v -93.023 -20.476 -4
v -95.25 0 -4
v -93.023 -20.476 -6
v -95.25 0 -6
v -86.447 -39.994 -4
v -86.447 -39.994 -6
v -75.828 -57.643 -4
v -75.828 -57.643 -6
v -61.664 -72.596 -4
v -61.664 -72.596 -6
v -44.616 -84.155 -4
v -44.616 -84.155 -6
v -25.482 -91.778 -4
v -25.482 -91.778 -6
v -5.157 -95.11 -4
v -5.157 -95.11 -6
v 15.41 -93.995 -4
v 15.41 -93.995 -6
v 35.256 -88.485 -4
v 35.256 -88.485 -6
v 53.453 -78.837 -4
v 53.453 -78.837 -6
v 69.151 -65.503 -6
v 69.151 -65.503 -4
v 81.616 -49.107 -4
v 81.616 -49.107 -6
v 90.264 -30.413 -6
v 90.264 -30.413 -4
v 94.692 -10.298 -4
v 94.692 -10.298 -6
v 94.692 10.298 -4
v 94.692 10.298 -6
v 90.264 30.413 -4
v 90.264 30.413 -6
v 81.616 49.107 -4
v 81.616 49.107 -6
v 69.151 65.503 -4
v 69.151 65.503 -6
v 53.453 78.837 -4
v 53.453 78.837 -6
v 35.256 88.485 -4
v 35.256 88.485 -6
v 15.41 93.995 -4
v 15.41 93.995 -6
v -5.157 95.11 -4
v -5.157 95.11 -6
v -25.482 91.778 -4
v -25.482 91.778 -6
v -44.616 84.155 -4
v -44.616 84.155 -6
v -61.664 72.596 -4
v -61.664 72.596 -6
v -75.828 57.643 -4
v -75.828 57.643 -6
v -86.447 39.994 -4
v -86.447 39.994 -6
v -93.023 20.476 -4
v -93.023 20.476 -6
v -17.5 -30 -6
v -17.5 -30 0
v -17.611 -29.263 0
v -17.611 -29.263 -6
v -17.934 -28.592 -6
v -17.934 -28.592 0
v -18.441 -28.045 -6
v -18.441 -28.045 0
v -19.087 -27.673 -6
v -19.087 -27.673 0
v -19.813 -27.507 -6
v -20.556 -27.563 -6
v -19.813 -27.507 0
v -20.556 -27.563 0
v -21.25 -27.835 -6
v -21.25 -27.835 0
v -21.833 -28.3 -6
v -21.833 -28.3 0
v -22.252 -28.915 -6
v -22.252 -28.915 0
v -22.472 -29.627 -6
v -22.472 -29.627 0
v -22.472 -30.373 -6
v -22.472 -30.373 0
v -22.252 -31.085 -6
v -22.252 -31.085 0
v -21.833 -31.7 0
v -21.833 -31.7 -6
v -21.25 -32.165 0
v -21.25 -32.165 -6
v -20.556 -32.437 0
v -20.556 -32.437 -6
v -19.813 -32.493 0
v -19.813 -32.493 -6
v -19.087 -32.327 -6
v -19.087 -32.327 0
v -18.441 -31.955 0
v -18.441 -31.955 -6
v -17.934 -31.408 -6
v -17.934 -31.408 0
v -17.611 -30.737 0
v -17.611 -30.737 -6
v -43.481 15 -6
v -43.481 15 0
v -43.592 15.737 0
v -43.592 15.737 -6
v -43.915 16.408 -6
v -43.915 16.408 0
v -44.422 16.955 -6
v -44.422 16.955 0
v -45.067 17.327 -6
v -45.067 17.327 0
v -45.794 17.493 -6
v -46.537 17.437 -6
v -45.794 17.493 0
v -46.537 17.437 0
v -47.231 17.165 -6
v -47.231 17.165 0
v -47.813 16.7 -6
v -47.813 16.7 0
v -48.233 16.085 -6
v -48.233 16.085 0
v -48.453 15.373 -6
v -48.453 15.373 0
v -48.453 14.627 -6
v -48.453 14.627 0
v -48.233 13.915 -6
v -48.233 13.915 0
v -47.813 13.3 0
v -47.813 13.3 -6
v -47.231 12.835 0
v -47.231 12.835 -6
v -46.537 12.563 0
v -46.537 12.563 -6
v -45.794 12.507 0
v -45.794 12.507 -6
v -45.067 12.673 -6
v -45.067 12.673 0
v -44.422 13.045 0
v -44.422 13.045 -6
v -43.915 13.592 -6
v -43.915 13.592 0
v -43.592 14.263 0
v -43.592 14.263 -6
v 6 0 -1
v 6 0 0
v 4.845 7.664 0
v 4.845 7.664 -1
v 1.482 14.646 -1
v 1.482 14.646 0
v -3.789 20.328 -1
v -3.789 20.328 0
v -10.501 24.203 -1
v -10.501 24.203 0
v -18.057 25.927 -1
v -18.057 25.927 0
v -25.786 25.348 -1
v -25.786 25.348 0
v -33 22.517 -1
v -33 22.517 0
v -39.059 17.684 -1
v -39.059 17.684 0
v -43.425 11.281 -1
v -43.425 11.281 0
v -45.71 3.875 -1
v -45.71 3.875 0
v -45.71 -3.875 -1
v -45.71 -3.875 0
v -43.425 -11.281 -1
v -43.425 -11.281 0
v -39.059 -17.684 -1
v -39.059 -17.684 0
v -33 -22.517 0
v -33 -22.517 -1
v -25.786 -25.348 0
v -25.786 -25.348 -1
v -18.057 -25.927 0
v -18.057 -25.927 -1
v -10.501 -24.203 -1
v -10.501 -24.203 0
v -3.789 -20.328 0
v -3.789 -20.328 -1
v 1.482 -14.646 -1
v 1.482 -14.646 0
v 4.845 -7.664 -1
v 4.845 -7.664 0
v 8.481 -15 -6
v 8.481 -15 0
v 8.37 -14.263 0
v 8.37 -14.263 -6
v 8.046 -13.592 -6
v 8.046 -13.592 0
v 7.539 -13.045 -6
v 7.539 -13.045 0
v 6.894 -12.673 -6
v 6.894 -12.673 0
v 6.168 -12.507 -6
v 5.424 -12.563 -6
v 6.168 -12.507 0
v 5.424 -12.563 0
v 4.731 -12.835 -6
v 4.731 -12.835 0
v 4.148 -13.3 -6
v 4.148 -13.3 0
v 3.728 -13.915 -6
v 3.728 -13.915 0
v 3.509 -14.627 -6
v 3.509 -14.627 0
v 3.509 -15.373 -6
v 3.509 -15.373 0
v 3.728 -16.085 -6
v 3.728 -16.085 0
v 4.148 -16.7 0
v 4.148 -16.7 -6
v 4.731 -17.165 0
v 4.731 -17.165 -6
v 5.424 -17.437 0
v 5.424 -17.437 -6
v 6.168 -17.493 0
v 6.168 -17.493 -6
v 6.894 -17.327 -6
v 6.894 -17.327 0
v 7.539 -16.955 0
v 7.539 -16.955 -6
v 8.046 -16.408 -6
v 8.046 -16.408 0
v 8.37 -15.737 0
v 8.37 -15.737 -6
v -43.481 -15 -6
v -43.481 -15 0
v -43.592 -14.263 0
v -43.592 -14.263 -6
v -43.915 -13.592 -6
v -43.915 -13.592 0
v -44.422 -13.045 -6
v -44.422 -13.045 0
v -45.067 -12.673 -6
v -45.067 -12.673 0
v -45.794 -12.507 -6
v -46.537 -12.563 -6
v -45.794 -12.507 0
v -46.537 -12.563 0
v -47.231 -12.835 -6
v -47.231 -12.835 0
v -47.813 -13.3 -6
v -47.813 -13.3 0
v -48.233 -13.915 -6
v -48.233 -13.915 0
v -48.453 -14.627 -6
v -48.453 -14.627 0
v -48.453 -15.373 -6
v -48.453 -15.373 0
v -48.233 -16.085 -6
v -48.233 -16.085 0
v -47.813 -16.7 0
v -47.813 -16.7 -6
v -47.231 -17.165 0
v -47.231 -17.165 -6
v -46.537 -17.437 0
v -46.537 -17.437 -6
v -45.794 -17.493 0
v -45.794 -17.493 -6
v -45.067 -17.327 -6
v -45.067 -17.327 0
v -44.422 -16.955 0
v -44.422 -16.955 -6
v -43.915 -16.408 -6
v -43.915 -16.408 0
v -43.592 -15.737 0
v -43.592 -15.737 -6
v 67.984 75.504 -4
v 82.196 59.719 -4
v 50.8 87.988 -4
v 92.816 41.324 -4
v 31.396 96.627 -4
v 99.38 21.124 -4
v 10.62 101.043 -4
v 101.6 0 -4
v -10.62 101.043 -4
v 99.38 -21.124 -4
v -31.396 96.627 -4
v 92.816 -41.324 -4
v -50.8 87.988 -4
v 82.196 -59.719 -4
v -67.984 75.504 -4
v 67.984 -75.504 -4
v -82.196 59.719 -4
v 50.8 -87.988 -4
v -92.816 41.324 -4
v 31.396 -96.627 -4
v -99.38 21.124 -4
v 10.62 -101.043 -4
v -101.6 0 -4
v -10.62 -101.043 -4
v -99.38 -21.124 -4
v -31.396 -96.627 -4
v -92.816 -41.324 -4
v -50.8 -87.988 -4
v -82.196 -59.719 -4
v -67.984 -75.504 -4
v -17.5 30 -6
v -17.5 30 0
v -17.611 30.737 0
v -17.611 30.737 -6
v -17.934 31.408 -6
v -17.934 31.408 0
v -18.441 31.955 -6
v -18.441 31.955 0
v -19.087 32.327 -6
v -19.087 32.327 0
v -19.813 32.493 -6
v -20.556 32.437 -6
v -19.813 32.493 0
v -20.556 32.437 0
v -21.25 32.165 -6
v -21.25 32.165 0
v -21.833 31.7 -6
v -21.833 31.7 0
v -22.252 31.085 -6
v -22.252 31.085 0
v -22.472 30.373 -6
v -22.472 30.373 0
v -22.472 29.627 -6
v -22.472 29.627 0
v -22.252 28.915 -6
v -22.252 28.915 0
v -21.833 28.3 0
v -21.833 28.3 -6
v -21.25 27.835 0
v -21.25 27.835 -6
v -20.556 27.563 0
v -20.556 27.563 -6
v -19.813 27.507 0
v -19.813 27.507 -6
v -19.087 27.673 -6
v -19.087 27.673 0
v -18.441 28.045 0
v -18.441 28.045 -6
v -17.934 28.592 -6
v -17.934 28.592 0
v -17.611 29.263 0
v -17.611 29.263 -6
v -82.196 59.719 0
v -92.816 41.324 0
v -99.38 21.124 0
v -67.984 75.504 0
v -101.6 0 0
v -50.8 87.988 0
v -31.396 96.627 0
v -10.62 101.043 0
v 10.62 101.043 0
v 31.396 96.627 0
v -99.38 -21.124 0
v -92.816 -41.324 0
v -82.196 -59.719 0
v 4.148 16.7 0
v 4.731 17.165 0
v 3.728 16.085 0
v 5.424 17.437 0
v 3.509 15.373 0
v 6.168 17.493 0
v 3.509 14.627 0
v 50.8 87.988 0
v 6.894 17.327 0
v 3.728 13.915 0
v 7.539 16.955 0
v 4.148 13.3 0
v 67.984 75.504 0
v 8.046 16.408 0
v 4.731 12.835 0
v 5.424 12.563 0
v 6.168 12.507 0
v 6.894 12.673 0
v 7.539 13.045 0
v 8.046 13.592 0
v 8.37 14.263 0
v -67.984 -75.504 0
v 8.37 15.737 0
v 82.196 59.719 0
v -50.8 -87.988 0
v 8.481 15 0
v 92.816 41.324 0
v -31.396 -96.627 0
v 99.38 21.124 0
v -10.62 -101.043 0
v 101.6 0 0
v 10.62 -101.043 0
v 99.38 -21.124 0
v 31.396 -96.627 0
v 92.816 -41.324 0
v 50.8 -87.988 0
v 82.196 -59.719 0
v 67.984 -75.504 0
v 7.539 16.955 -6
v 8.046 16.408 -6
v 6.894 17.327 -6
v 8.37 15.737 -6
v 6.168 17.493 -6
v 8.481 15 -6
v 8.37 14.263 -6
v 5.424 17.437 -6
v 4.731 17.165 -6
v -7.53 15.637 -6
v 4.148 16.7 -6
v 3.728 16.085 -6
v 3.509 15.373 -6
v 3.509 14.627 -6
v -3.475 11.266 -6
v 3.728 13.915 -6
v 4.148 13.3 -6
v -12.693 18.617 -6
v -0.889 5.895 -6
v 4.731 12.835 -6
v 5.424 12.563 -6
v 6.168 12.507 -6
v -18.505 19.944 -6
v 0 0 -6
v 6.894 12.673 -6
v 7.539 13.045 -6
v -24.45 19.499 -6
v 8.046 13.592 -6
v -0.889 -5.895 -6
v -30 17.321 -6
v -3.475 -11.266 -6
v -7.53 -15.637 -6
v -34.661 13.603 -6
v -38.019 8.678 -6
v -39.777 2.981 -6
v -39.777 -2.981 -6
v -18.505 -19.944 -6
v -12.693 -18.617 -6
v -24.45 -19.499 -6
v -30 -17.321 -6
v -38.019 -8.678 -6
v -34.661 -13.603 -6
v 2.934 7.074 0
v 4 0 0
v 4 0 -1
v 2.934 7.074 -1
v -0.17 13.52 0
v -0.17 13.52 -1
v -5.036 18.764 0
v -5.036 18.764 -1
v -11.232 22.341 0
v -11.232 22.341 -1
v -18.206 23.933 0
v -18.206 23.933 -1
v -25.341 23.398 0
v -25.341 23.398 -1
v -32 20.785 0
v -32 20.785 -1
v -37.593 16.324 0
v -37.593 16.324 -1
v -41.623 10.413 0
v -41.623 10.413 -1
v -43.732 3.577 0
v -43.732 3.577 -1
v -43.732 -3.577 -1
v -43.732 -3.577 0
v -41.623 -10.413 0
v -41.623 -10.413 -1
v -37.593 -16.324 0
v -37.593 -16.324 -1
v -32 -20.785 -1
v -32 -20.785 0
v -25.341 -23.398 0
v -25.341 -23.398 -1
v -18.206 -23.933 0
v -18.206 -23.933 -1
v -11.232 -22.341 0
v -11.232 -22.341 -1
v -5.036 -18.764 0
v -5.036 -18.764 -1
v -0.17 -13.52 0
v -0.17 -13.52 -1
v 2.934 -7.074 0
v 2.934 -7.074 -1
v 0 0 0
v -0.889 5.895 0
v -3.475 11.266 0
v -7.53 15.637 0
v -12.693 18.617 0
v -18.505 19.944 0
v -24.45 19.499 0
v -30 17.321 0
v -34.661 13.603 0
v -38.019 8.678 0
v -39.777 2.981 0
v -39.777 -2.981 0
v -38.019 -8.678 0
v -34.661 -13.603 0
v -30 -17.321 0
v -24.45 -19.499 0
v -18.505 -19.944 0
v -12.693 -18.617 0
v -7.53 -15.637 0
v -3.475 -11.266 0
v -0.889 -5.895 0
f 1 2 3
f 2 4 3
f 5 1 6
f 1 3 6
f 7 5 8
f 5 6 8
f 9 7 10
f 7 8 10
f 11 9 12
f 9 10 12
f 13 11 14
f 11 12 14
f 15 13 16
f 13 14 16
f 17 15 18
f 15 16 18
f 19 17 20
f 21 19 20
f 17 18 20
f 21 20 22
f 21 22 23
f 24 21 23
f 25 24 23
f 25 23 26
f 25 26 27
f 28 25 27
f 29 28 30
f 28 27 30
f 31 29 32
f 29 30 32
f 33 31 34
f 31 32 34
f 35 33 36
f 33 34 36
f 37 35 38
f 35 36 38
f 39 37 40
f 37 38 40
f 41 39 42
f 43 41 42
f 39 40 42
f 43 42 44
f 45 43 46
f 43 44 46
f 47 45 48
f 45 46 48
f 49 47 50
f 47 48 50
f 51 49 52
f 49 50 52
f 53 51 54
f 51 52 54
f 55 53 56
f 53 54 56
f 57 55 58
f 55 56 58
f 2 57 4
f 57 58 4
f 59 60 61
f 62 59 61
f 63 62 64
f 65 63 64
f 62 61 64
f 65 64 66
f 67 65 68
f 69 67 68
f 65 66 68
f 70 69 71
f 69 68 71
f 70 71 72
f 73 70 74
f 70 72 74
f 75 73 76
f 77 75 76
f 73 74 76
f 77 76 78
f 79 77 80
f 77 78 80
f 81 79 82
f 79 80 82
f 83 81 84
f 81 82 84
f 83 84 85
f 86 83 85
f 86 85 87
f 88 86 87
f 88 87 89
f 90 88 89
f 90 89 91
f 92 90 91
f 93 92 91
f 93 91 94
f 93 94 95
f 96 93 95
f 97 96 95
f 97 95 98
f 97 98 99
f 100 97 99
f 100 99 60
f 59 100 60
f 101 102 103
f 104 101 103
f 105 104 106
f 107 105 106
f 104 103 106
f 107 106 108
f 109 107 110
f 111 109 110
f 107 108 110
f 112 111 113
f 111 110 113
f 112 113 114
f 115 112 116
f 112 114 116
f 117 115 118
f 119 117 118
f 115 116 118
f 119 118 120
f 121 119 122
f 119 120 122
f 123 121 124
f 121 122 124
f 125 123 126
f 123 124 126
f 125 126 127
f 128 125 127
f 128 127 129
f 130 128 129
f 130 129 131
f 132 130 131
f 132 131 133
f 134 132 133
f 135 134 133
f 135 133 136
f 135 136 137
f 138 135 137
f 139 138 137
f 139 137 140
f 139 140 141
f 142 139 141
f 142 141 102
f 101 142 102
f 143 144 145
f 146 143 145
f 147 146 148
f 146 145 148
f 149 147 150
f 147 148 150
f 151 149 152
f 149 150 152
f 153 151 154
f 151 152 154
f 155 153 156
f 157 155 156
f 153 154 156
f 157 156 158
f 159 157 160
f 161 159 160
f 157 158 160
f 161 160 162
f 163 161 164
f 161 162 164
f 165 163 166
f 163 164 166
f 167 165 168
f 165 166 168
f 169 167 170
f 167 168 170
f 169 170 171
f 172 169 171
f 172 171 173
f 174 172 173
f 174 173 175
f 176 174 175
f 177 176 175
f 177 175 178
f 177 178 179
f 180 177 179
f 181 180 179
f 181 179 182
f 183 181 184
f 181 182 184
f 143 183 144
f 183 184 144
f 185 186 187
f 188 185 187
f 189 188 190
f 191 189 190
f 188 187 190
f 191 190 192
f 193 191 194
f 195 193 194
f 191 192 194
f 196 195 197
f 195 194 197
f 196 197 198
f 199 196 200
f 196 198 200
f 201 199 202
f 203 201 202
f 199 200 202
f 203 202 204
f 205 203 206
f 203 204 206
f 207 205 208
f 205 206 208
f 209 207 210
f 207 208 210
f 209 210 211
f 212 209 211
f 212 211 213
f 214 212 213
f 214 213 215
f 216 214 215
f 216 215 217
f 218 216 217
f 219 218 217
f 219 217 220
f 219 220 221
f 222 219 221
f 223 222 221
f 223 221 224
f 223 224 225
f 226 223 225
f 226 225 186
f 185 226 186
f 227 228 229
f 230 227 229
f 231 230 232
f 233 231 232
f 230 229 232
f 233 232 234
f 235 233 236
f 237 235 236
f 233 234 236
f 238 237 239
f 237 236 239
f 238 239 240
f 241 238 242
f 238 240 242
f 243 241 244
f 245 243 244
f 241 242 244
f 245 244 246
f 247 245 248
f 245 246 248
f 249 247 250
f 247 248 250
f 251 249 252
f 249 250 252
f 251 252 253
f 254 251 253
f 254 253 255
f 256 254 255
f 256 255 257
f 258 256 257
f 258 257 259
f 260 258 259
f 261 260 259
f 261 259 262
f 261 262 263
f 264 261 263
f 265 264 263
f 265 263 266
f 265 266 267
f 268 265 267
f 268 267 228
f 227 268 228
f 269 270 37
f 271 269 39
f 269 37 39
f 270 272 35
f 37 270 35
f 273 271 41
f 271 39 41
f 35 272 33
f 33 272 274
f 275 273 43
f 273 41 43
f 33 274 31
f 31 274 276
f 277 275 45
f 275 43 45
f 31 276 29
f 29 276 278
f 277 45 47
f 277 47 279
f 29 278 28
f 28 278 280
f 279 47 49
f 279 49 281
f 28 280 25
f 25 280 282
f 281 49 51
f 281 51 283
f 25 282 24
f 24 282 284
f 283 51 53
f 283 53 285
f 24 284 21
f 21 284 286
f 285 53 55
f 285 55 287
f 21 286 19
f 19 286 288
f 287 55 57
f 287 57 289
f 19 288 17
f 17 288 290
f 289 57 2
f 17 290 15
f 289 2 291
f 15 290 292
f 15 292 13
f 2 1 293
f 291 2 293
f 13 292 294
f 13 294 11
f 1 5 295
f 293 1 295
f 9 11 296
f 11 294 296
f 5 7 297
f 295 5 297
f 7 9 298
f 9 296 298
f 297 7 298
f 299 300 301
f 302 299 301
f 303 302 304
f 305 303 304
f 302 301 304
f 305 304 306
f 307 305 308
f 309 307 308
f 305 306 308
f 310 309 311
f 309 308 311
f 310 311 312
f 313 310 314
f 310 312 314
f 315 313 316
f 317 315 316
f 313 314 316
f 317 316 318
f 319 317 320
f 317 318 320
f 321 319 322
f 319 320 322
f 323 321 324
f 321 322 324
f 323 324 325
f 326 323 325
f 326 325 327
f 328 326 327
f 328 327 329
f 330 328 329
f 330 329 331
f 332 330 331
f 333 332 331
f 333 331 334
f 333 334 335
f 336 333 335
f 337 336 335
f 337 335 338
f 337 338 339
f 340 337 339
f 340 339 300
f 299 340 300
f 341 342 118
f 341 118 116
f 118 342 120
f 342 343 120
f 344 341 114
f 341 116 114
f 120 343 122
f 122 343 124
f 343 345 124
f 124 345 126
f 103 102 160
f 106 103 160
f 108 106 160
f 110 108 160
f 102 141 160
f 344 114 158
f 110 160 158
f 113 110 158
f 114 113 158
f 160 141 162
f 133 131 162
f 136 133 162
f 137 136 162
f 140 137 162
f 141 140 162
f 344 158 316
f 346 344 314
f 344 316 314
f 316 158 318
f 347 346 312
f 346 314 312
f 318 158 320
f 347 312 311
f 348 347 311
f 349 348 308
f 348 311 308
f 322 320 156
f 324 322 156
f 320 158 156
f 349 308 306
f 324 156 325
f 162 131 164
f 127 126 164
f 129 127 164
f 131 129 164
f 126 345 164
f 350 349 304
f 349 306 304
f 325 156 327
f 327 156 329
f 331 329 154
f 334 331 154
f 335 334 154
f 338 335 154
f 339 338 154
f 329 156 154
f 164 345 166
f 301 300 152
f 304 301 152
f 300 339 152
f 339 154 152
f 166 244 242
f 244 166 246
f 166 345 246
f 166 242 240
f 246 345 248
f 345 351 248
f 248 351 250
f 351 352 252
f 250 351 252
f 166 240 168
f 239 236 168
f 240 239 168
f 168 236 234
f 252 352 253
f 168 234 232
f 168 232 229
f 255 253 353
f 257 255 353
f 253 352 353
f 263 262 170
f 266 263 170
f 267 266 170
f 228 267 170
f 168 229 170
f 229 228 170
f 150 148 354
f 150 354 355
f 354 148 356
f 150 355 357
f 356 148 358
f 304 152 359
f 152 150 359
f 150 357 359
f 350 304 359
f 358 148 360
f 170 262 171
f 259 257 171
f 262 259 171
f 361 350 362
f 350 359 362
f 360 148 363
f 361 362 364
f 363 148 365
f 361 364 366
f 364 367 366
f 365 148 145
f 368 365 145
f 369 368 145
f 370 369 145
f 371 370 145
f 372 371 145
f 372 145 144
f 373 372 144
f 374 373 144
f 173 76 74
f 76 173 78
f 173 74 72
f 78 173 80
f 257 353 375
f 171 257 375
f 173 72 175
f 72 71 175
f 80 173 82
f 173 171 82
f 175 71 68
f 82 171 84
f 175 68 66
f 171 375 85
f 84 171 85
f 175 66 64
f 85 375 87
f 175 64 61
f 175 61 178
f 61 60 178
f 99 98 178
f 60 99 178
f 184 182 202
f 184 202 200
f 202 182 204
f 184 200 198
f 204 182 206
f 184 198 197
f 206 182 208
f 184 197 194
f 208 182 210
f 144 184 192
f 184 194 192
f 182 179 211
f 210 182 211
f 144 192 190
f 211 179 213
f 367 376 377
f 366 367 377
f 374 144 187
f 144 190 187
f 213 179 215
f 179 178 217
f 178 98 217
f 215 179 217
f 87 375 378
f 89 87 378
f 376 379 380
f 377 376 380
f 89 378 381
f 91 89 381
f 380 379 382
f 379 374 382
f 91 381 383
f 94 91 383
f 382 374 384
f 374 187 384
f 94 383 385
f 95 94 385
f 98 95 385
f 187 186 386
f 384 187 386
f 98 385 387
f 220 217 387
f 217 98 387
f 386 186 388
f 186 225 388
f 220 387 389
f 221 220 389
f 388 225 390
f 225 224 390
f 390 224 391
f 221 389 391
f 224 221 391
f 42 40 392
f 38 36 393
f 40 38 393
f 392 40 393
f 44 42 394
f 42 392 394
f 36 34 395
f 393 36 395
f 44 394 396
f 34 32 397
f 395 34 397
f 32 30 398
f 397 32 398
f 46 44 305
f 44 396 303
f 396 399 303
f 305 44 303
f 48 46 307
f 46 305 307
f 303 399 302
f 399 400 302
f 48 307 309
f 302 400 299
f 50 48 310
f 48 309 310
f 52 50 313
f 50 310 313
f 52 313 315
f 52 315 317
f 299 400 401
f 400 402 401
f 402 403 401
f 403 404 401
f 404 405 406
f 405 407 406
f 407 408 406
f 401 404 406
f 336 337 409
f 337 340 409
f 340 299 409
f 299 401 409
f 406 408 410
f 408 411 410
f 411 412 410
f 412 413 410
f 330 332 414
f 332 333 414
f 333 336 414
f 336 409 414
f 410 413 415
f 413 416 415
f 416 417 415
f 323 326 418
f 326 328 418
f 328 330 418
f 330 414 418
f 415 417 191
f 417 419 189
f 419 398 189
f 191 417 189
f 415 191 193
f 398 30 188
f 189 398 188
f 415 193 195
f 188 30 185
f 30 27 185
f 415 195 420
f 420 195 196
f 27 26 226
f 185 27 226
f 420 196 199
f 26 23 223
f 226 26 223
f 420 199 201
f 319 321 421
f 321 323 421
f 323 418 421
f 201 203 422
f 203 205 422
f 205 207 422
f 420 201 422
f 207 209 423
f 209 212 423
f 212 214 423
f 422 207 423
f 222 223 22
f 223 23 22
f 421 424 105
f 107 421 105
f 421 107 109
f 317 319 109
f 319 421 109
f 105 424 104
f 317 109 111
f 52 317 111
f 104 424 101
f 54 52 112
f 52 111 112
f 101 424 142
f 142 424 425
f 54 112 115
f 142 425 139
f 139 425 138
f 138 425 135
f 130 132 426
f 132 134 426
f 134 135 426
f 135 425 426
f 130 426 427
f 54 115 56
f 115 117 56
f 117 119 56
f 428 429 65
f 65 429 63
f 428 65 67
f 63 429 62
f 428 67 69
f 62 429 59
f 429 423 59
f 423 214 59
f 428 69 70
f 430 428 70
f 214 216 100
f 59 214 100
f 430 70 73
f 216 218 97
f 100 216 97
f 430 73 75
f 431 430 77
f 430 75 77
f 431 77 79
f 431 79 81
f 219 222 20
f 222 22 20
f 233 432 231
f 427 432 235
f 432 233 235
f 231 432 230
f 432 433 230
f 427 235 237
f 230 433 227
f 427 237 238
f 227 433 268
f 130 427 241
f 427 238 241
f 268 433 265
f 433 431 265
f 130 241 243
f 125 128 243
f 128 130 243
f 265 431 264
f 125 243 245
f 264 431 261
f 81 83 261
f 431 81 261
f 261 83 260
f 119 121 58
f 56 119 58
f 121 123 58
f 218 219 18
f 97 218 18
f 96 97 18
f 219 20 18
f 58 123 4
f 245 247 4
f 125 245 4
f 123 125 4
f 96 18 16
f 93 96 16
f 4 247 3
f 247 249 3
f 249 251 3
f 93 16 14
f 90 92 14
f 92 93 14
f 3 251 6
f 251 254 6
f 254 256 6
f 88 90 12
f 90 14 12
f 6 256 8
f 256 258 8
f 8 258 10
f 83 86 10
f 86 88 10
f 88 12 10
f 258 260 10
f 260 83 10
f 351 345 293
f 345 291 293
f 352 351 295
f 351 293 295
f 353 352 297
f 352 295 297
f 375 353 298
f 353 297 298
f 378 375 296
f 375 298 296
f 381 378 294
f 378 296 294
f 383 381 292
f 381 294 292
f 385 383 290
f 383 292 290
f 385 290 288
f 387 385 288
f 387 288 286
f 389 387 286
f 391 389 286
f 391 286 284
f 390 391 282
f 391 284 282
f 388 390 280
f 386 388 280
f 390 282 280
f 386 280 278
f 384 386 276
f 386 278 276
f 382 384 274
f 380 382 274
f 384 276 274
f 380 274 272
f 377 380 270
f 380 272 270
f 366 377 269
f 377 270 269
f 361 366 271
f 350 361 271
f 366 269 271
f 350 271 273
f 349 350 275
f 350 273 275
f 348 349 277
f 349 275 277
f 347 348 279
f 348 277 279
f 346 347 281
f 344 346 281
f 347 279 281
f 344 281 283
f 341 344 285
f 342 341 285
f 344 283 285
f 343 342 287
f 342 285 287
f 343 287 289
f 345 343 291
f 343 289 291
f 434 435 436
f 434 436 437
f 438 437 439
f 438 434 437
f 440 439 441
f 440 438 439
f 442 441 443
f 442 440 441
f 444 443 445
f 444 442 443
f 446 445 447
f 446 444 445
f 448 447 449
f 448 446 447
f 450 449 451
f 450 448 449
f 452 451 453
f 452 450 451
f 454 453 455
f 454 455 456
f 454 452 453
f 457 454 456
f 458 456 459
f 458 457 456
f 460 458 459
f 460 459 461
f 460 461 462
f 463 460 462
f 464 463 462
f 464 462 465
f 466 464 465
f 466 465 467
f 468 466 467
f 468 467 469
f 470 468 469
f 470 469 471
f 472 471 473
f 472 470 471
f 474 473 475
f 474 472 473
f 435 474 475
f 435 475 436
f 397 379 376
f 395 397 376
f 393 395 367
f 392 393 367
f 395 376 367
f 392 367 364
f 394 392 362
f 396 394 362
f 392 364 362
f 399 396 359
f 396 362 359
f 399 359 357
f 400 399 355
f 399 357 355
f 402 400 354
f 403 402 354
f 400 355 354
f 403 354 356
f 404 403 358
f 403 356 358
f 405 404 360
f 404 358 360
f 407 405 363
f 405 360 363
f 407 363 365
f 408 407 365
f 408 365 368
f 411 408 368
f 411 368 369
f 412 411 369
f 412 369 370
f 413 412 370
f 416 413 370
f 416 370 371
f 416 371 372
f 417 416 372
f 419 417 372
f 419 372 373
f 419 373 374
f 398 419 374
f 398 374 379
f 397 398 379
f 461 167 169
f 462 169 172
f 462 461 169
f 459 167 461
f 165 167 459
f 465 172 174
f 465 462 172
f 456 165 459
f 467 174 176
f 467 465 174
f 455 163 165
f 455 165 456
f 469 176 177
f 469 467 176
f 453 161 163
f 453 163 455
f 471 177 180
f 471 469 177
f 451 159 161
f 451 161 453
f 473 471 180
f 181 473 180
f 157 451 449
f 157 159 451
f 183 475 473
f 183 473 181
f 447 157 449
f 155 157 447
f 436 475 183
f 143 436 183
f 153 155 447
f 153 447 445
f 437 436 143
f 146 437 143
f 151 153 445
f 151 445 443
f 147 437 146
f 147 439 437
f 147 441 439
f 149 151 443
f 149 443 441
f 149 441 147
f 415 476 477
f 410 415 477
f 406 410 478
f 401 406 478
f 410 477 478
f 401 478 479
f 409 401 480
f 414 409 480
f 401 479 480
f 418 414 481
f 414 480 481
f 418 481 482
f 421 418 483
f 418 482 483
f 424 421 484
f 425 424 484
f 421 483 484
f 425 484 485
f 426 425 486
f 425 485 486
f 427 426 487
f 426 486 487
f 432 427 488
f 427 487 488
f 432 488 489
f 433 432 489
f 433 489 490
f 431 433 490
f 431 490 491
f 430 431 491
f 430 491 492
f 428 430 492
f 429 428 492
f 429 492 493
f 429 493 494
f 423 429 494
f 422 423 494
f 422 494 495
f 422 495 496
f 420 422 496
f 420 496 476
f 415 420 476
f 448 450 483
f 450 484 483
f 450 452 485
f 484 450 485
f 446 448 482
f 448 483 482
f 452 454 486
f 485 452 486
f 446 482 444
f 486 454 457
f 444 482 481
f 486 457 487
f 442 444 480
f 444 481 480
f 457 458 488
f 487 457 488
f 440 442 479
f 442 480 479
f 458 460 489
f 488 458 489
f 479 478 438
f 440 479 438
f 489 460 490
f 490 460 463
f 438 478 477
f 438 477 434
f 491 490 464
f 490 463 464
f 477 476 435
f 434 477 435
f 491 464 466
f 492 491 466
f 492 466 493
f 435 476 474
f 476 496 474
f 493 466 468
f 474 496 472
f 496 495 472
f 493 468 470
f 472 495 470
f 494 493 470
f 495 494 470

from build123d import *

# Parameters (mm, degrees)
SKETCH3_R          = 20
CUT_EXTRUDE1_DEPTH = 144.809318196
SKETCH4_R          = 2.5
CUT_EXTRUDE3_DEPTH = 144.809318196
SKETCH5_R          = 26
SKETCH5_R_2        = 24
CUT_EXTRUDE4_DEPTH = 1


with BuildPart() as part:
    # Sketch2 → Revolve1 (revolve)
    with BuildSketch(Plane(origin=(0, 0, 0), x_dir=(0, 0, -1), z_dir=(1, 0, 0)), mode=Mode.PRIVATE) as revolve1_sk:
        Polygon((0, 0), (0, 101.6), (4, 101.6), (4, 95.25), (6, 95.25), (6, 0), align=None)
    revolve(revolve1_sk.sketch.rotate(Axis((0, 0, -6), (0, 0, 1)), 90), axis=Axis((0, 0, -6), (0, 0, 1)))

    # Sketch3 → Cut-Extrude1 (cut, through all)
    with BuildSketch(Plane.XY):
        with Locations((-20, 0)):
            Circle(SKETCH3_R)
    extrude(amount=-CUT_EXTRUDE1_DEPTH, mode=Mode.SUBTRACT)

    # Sketch4 → Cut-Extrude3 (cut, through all)
    with BuildSketch(Plane.XY):
        with Locations((-20, 30)):
            Circle(SKETCH4_R)
        with Locations((5.980762114, 15)):
            Circle(SKETCH4_R)
        with Locations((5.980762114, -15)):
            Circle(SKETCH4_R)
        with Locations((-20, -30)):
            Circle(SKETCH4_R)
        with Locations((-45.980762114, -15)):
            Circle(SKETCH4_R)
        with Locations((-45.980762114, 15)):
            Circle(SKETCH4_R)
    extrude(amount=-CUT_EXTRUDE3_DEPTH, mode=Mode.SUBTRACT)

    # Sketch5 → Cut-Extrude4 (cut)
    with BuildSketch(Plane.XY):
        with Locations((-20, 0)):
            Circle(SKETCH5_R)
        with Locations((-20, 0)):
            Circle(SKETCH5_R_2, mode=Mode.SUBTRACT)
    extrude(amount=-CUT_EXTRUDE4_DEPTH, mode=Mode.SUBTRACT)


solid = part.part
